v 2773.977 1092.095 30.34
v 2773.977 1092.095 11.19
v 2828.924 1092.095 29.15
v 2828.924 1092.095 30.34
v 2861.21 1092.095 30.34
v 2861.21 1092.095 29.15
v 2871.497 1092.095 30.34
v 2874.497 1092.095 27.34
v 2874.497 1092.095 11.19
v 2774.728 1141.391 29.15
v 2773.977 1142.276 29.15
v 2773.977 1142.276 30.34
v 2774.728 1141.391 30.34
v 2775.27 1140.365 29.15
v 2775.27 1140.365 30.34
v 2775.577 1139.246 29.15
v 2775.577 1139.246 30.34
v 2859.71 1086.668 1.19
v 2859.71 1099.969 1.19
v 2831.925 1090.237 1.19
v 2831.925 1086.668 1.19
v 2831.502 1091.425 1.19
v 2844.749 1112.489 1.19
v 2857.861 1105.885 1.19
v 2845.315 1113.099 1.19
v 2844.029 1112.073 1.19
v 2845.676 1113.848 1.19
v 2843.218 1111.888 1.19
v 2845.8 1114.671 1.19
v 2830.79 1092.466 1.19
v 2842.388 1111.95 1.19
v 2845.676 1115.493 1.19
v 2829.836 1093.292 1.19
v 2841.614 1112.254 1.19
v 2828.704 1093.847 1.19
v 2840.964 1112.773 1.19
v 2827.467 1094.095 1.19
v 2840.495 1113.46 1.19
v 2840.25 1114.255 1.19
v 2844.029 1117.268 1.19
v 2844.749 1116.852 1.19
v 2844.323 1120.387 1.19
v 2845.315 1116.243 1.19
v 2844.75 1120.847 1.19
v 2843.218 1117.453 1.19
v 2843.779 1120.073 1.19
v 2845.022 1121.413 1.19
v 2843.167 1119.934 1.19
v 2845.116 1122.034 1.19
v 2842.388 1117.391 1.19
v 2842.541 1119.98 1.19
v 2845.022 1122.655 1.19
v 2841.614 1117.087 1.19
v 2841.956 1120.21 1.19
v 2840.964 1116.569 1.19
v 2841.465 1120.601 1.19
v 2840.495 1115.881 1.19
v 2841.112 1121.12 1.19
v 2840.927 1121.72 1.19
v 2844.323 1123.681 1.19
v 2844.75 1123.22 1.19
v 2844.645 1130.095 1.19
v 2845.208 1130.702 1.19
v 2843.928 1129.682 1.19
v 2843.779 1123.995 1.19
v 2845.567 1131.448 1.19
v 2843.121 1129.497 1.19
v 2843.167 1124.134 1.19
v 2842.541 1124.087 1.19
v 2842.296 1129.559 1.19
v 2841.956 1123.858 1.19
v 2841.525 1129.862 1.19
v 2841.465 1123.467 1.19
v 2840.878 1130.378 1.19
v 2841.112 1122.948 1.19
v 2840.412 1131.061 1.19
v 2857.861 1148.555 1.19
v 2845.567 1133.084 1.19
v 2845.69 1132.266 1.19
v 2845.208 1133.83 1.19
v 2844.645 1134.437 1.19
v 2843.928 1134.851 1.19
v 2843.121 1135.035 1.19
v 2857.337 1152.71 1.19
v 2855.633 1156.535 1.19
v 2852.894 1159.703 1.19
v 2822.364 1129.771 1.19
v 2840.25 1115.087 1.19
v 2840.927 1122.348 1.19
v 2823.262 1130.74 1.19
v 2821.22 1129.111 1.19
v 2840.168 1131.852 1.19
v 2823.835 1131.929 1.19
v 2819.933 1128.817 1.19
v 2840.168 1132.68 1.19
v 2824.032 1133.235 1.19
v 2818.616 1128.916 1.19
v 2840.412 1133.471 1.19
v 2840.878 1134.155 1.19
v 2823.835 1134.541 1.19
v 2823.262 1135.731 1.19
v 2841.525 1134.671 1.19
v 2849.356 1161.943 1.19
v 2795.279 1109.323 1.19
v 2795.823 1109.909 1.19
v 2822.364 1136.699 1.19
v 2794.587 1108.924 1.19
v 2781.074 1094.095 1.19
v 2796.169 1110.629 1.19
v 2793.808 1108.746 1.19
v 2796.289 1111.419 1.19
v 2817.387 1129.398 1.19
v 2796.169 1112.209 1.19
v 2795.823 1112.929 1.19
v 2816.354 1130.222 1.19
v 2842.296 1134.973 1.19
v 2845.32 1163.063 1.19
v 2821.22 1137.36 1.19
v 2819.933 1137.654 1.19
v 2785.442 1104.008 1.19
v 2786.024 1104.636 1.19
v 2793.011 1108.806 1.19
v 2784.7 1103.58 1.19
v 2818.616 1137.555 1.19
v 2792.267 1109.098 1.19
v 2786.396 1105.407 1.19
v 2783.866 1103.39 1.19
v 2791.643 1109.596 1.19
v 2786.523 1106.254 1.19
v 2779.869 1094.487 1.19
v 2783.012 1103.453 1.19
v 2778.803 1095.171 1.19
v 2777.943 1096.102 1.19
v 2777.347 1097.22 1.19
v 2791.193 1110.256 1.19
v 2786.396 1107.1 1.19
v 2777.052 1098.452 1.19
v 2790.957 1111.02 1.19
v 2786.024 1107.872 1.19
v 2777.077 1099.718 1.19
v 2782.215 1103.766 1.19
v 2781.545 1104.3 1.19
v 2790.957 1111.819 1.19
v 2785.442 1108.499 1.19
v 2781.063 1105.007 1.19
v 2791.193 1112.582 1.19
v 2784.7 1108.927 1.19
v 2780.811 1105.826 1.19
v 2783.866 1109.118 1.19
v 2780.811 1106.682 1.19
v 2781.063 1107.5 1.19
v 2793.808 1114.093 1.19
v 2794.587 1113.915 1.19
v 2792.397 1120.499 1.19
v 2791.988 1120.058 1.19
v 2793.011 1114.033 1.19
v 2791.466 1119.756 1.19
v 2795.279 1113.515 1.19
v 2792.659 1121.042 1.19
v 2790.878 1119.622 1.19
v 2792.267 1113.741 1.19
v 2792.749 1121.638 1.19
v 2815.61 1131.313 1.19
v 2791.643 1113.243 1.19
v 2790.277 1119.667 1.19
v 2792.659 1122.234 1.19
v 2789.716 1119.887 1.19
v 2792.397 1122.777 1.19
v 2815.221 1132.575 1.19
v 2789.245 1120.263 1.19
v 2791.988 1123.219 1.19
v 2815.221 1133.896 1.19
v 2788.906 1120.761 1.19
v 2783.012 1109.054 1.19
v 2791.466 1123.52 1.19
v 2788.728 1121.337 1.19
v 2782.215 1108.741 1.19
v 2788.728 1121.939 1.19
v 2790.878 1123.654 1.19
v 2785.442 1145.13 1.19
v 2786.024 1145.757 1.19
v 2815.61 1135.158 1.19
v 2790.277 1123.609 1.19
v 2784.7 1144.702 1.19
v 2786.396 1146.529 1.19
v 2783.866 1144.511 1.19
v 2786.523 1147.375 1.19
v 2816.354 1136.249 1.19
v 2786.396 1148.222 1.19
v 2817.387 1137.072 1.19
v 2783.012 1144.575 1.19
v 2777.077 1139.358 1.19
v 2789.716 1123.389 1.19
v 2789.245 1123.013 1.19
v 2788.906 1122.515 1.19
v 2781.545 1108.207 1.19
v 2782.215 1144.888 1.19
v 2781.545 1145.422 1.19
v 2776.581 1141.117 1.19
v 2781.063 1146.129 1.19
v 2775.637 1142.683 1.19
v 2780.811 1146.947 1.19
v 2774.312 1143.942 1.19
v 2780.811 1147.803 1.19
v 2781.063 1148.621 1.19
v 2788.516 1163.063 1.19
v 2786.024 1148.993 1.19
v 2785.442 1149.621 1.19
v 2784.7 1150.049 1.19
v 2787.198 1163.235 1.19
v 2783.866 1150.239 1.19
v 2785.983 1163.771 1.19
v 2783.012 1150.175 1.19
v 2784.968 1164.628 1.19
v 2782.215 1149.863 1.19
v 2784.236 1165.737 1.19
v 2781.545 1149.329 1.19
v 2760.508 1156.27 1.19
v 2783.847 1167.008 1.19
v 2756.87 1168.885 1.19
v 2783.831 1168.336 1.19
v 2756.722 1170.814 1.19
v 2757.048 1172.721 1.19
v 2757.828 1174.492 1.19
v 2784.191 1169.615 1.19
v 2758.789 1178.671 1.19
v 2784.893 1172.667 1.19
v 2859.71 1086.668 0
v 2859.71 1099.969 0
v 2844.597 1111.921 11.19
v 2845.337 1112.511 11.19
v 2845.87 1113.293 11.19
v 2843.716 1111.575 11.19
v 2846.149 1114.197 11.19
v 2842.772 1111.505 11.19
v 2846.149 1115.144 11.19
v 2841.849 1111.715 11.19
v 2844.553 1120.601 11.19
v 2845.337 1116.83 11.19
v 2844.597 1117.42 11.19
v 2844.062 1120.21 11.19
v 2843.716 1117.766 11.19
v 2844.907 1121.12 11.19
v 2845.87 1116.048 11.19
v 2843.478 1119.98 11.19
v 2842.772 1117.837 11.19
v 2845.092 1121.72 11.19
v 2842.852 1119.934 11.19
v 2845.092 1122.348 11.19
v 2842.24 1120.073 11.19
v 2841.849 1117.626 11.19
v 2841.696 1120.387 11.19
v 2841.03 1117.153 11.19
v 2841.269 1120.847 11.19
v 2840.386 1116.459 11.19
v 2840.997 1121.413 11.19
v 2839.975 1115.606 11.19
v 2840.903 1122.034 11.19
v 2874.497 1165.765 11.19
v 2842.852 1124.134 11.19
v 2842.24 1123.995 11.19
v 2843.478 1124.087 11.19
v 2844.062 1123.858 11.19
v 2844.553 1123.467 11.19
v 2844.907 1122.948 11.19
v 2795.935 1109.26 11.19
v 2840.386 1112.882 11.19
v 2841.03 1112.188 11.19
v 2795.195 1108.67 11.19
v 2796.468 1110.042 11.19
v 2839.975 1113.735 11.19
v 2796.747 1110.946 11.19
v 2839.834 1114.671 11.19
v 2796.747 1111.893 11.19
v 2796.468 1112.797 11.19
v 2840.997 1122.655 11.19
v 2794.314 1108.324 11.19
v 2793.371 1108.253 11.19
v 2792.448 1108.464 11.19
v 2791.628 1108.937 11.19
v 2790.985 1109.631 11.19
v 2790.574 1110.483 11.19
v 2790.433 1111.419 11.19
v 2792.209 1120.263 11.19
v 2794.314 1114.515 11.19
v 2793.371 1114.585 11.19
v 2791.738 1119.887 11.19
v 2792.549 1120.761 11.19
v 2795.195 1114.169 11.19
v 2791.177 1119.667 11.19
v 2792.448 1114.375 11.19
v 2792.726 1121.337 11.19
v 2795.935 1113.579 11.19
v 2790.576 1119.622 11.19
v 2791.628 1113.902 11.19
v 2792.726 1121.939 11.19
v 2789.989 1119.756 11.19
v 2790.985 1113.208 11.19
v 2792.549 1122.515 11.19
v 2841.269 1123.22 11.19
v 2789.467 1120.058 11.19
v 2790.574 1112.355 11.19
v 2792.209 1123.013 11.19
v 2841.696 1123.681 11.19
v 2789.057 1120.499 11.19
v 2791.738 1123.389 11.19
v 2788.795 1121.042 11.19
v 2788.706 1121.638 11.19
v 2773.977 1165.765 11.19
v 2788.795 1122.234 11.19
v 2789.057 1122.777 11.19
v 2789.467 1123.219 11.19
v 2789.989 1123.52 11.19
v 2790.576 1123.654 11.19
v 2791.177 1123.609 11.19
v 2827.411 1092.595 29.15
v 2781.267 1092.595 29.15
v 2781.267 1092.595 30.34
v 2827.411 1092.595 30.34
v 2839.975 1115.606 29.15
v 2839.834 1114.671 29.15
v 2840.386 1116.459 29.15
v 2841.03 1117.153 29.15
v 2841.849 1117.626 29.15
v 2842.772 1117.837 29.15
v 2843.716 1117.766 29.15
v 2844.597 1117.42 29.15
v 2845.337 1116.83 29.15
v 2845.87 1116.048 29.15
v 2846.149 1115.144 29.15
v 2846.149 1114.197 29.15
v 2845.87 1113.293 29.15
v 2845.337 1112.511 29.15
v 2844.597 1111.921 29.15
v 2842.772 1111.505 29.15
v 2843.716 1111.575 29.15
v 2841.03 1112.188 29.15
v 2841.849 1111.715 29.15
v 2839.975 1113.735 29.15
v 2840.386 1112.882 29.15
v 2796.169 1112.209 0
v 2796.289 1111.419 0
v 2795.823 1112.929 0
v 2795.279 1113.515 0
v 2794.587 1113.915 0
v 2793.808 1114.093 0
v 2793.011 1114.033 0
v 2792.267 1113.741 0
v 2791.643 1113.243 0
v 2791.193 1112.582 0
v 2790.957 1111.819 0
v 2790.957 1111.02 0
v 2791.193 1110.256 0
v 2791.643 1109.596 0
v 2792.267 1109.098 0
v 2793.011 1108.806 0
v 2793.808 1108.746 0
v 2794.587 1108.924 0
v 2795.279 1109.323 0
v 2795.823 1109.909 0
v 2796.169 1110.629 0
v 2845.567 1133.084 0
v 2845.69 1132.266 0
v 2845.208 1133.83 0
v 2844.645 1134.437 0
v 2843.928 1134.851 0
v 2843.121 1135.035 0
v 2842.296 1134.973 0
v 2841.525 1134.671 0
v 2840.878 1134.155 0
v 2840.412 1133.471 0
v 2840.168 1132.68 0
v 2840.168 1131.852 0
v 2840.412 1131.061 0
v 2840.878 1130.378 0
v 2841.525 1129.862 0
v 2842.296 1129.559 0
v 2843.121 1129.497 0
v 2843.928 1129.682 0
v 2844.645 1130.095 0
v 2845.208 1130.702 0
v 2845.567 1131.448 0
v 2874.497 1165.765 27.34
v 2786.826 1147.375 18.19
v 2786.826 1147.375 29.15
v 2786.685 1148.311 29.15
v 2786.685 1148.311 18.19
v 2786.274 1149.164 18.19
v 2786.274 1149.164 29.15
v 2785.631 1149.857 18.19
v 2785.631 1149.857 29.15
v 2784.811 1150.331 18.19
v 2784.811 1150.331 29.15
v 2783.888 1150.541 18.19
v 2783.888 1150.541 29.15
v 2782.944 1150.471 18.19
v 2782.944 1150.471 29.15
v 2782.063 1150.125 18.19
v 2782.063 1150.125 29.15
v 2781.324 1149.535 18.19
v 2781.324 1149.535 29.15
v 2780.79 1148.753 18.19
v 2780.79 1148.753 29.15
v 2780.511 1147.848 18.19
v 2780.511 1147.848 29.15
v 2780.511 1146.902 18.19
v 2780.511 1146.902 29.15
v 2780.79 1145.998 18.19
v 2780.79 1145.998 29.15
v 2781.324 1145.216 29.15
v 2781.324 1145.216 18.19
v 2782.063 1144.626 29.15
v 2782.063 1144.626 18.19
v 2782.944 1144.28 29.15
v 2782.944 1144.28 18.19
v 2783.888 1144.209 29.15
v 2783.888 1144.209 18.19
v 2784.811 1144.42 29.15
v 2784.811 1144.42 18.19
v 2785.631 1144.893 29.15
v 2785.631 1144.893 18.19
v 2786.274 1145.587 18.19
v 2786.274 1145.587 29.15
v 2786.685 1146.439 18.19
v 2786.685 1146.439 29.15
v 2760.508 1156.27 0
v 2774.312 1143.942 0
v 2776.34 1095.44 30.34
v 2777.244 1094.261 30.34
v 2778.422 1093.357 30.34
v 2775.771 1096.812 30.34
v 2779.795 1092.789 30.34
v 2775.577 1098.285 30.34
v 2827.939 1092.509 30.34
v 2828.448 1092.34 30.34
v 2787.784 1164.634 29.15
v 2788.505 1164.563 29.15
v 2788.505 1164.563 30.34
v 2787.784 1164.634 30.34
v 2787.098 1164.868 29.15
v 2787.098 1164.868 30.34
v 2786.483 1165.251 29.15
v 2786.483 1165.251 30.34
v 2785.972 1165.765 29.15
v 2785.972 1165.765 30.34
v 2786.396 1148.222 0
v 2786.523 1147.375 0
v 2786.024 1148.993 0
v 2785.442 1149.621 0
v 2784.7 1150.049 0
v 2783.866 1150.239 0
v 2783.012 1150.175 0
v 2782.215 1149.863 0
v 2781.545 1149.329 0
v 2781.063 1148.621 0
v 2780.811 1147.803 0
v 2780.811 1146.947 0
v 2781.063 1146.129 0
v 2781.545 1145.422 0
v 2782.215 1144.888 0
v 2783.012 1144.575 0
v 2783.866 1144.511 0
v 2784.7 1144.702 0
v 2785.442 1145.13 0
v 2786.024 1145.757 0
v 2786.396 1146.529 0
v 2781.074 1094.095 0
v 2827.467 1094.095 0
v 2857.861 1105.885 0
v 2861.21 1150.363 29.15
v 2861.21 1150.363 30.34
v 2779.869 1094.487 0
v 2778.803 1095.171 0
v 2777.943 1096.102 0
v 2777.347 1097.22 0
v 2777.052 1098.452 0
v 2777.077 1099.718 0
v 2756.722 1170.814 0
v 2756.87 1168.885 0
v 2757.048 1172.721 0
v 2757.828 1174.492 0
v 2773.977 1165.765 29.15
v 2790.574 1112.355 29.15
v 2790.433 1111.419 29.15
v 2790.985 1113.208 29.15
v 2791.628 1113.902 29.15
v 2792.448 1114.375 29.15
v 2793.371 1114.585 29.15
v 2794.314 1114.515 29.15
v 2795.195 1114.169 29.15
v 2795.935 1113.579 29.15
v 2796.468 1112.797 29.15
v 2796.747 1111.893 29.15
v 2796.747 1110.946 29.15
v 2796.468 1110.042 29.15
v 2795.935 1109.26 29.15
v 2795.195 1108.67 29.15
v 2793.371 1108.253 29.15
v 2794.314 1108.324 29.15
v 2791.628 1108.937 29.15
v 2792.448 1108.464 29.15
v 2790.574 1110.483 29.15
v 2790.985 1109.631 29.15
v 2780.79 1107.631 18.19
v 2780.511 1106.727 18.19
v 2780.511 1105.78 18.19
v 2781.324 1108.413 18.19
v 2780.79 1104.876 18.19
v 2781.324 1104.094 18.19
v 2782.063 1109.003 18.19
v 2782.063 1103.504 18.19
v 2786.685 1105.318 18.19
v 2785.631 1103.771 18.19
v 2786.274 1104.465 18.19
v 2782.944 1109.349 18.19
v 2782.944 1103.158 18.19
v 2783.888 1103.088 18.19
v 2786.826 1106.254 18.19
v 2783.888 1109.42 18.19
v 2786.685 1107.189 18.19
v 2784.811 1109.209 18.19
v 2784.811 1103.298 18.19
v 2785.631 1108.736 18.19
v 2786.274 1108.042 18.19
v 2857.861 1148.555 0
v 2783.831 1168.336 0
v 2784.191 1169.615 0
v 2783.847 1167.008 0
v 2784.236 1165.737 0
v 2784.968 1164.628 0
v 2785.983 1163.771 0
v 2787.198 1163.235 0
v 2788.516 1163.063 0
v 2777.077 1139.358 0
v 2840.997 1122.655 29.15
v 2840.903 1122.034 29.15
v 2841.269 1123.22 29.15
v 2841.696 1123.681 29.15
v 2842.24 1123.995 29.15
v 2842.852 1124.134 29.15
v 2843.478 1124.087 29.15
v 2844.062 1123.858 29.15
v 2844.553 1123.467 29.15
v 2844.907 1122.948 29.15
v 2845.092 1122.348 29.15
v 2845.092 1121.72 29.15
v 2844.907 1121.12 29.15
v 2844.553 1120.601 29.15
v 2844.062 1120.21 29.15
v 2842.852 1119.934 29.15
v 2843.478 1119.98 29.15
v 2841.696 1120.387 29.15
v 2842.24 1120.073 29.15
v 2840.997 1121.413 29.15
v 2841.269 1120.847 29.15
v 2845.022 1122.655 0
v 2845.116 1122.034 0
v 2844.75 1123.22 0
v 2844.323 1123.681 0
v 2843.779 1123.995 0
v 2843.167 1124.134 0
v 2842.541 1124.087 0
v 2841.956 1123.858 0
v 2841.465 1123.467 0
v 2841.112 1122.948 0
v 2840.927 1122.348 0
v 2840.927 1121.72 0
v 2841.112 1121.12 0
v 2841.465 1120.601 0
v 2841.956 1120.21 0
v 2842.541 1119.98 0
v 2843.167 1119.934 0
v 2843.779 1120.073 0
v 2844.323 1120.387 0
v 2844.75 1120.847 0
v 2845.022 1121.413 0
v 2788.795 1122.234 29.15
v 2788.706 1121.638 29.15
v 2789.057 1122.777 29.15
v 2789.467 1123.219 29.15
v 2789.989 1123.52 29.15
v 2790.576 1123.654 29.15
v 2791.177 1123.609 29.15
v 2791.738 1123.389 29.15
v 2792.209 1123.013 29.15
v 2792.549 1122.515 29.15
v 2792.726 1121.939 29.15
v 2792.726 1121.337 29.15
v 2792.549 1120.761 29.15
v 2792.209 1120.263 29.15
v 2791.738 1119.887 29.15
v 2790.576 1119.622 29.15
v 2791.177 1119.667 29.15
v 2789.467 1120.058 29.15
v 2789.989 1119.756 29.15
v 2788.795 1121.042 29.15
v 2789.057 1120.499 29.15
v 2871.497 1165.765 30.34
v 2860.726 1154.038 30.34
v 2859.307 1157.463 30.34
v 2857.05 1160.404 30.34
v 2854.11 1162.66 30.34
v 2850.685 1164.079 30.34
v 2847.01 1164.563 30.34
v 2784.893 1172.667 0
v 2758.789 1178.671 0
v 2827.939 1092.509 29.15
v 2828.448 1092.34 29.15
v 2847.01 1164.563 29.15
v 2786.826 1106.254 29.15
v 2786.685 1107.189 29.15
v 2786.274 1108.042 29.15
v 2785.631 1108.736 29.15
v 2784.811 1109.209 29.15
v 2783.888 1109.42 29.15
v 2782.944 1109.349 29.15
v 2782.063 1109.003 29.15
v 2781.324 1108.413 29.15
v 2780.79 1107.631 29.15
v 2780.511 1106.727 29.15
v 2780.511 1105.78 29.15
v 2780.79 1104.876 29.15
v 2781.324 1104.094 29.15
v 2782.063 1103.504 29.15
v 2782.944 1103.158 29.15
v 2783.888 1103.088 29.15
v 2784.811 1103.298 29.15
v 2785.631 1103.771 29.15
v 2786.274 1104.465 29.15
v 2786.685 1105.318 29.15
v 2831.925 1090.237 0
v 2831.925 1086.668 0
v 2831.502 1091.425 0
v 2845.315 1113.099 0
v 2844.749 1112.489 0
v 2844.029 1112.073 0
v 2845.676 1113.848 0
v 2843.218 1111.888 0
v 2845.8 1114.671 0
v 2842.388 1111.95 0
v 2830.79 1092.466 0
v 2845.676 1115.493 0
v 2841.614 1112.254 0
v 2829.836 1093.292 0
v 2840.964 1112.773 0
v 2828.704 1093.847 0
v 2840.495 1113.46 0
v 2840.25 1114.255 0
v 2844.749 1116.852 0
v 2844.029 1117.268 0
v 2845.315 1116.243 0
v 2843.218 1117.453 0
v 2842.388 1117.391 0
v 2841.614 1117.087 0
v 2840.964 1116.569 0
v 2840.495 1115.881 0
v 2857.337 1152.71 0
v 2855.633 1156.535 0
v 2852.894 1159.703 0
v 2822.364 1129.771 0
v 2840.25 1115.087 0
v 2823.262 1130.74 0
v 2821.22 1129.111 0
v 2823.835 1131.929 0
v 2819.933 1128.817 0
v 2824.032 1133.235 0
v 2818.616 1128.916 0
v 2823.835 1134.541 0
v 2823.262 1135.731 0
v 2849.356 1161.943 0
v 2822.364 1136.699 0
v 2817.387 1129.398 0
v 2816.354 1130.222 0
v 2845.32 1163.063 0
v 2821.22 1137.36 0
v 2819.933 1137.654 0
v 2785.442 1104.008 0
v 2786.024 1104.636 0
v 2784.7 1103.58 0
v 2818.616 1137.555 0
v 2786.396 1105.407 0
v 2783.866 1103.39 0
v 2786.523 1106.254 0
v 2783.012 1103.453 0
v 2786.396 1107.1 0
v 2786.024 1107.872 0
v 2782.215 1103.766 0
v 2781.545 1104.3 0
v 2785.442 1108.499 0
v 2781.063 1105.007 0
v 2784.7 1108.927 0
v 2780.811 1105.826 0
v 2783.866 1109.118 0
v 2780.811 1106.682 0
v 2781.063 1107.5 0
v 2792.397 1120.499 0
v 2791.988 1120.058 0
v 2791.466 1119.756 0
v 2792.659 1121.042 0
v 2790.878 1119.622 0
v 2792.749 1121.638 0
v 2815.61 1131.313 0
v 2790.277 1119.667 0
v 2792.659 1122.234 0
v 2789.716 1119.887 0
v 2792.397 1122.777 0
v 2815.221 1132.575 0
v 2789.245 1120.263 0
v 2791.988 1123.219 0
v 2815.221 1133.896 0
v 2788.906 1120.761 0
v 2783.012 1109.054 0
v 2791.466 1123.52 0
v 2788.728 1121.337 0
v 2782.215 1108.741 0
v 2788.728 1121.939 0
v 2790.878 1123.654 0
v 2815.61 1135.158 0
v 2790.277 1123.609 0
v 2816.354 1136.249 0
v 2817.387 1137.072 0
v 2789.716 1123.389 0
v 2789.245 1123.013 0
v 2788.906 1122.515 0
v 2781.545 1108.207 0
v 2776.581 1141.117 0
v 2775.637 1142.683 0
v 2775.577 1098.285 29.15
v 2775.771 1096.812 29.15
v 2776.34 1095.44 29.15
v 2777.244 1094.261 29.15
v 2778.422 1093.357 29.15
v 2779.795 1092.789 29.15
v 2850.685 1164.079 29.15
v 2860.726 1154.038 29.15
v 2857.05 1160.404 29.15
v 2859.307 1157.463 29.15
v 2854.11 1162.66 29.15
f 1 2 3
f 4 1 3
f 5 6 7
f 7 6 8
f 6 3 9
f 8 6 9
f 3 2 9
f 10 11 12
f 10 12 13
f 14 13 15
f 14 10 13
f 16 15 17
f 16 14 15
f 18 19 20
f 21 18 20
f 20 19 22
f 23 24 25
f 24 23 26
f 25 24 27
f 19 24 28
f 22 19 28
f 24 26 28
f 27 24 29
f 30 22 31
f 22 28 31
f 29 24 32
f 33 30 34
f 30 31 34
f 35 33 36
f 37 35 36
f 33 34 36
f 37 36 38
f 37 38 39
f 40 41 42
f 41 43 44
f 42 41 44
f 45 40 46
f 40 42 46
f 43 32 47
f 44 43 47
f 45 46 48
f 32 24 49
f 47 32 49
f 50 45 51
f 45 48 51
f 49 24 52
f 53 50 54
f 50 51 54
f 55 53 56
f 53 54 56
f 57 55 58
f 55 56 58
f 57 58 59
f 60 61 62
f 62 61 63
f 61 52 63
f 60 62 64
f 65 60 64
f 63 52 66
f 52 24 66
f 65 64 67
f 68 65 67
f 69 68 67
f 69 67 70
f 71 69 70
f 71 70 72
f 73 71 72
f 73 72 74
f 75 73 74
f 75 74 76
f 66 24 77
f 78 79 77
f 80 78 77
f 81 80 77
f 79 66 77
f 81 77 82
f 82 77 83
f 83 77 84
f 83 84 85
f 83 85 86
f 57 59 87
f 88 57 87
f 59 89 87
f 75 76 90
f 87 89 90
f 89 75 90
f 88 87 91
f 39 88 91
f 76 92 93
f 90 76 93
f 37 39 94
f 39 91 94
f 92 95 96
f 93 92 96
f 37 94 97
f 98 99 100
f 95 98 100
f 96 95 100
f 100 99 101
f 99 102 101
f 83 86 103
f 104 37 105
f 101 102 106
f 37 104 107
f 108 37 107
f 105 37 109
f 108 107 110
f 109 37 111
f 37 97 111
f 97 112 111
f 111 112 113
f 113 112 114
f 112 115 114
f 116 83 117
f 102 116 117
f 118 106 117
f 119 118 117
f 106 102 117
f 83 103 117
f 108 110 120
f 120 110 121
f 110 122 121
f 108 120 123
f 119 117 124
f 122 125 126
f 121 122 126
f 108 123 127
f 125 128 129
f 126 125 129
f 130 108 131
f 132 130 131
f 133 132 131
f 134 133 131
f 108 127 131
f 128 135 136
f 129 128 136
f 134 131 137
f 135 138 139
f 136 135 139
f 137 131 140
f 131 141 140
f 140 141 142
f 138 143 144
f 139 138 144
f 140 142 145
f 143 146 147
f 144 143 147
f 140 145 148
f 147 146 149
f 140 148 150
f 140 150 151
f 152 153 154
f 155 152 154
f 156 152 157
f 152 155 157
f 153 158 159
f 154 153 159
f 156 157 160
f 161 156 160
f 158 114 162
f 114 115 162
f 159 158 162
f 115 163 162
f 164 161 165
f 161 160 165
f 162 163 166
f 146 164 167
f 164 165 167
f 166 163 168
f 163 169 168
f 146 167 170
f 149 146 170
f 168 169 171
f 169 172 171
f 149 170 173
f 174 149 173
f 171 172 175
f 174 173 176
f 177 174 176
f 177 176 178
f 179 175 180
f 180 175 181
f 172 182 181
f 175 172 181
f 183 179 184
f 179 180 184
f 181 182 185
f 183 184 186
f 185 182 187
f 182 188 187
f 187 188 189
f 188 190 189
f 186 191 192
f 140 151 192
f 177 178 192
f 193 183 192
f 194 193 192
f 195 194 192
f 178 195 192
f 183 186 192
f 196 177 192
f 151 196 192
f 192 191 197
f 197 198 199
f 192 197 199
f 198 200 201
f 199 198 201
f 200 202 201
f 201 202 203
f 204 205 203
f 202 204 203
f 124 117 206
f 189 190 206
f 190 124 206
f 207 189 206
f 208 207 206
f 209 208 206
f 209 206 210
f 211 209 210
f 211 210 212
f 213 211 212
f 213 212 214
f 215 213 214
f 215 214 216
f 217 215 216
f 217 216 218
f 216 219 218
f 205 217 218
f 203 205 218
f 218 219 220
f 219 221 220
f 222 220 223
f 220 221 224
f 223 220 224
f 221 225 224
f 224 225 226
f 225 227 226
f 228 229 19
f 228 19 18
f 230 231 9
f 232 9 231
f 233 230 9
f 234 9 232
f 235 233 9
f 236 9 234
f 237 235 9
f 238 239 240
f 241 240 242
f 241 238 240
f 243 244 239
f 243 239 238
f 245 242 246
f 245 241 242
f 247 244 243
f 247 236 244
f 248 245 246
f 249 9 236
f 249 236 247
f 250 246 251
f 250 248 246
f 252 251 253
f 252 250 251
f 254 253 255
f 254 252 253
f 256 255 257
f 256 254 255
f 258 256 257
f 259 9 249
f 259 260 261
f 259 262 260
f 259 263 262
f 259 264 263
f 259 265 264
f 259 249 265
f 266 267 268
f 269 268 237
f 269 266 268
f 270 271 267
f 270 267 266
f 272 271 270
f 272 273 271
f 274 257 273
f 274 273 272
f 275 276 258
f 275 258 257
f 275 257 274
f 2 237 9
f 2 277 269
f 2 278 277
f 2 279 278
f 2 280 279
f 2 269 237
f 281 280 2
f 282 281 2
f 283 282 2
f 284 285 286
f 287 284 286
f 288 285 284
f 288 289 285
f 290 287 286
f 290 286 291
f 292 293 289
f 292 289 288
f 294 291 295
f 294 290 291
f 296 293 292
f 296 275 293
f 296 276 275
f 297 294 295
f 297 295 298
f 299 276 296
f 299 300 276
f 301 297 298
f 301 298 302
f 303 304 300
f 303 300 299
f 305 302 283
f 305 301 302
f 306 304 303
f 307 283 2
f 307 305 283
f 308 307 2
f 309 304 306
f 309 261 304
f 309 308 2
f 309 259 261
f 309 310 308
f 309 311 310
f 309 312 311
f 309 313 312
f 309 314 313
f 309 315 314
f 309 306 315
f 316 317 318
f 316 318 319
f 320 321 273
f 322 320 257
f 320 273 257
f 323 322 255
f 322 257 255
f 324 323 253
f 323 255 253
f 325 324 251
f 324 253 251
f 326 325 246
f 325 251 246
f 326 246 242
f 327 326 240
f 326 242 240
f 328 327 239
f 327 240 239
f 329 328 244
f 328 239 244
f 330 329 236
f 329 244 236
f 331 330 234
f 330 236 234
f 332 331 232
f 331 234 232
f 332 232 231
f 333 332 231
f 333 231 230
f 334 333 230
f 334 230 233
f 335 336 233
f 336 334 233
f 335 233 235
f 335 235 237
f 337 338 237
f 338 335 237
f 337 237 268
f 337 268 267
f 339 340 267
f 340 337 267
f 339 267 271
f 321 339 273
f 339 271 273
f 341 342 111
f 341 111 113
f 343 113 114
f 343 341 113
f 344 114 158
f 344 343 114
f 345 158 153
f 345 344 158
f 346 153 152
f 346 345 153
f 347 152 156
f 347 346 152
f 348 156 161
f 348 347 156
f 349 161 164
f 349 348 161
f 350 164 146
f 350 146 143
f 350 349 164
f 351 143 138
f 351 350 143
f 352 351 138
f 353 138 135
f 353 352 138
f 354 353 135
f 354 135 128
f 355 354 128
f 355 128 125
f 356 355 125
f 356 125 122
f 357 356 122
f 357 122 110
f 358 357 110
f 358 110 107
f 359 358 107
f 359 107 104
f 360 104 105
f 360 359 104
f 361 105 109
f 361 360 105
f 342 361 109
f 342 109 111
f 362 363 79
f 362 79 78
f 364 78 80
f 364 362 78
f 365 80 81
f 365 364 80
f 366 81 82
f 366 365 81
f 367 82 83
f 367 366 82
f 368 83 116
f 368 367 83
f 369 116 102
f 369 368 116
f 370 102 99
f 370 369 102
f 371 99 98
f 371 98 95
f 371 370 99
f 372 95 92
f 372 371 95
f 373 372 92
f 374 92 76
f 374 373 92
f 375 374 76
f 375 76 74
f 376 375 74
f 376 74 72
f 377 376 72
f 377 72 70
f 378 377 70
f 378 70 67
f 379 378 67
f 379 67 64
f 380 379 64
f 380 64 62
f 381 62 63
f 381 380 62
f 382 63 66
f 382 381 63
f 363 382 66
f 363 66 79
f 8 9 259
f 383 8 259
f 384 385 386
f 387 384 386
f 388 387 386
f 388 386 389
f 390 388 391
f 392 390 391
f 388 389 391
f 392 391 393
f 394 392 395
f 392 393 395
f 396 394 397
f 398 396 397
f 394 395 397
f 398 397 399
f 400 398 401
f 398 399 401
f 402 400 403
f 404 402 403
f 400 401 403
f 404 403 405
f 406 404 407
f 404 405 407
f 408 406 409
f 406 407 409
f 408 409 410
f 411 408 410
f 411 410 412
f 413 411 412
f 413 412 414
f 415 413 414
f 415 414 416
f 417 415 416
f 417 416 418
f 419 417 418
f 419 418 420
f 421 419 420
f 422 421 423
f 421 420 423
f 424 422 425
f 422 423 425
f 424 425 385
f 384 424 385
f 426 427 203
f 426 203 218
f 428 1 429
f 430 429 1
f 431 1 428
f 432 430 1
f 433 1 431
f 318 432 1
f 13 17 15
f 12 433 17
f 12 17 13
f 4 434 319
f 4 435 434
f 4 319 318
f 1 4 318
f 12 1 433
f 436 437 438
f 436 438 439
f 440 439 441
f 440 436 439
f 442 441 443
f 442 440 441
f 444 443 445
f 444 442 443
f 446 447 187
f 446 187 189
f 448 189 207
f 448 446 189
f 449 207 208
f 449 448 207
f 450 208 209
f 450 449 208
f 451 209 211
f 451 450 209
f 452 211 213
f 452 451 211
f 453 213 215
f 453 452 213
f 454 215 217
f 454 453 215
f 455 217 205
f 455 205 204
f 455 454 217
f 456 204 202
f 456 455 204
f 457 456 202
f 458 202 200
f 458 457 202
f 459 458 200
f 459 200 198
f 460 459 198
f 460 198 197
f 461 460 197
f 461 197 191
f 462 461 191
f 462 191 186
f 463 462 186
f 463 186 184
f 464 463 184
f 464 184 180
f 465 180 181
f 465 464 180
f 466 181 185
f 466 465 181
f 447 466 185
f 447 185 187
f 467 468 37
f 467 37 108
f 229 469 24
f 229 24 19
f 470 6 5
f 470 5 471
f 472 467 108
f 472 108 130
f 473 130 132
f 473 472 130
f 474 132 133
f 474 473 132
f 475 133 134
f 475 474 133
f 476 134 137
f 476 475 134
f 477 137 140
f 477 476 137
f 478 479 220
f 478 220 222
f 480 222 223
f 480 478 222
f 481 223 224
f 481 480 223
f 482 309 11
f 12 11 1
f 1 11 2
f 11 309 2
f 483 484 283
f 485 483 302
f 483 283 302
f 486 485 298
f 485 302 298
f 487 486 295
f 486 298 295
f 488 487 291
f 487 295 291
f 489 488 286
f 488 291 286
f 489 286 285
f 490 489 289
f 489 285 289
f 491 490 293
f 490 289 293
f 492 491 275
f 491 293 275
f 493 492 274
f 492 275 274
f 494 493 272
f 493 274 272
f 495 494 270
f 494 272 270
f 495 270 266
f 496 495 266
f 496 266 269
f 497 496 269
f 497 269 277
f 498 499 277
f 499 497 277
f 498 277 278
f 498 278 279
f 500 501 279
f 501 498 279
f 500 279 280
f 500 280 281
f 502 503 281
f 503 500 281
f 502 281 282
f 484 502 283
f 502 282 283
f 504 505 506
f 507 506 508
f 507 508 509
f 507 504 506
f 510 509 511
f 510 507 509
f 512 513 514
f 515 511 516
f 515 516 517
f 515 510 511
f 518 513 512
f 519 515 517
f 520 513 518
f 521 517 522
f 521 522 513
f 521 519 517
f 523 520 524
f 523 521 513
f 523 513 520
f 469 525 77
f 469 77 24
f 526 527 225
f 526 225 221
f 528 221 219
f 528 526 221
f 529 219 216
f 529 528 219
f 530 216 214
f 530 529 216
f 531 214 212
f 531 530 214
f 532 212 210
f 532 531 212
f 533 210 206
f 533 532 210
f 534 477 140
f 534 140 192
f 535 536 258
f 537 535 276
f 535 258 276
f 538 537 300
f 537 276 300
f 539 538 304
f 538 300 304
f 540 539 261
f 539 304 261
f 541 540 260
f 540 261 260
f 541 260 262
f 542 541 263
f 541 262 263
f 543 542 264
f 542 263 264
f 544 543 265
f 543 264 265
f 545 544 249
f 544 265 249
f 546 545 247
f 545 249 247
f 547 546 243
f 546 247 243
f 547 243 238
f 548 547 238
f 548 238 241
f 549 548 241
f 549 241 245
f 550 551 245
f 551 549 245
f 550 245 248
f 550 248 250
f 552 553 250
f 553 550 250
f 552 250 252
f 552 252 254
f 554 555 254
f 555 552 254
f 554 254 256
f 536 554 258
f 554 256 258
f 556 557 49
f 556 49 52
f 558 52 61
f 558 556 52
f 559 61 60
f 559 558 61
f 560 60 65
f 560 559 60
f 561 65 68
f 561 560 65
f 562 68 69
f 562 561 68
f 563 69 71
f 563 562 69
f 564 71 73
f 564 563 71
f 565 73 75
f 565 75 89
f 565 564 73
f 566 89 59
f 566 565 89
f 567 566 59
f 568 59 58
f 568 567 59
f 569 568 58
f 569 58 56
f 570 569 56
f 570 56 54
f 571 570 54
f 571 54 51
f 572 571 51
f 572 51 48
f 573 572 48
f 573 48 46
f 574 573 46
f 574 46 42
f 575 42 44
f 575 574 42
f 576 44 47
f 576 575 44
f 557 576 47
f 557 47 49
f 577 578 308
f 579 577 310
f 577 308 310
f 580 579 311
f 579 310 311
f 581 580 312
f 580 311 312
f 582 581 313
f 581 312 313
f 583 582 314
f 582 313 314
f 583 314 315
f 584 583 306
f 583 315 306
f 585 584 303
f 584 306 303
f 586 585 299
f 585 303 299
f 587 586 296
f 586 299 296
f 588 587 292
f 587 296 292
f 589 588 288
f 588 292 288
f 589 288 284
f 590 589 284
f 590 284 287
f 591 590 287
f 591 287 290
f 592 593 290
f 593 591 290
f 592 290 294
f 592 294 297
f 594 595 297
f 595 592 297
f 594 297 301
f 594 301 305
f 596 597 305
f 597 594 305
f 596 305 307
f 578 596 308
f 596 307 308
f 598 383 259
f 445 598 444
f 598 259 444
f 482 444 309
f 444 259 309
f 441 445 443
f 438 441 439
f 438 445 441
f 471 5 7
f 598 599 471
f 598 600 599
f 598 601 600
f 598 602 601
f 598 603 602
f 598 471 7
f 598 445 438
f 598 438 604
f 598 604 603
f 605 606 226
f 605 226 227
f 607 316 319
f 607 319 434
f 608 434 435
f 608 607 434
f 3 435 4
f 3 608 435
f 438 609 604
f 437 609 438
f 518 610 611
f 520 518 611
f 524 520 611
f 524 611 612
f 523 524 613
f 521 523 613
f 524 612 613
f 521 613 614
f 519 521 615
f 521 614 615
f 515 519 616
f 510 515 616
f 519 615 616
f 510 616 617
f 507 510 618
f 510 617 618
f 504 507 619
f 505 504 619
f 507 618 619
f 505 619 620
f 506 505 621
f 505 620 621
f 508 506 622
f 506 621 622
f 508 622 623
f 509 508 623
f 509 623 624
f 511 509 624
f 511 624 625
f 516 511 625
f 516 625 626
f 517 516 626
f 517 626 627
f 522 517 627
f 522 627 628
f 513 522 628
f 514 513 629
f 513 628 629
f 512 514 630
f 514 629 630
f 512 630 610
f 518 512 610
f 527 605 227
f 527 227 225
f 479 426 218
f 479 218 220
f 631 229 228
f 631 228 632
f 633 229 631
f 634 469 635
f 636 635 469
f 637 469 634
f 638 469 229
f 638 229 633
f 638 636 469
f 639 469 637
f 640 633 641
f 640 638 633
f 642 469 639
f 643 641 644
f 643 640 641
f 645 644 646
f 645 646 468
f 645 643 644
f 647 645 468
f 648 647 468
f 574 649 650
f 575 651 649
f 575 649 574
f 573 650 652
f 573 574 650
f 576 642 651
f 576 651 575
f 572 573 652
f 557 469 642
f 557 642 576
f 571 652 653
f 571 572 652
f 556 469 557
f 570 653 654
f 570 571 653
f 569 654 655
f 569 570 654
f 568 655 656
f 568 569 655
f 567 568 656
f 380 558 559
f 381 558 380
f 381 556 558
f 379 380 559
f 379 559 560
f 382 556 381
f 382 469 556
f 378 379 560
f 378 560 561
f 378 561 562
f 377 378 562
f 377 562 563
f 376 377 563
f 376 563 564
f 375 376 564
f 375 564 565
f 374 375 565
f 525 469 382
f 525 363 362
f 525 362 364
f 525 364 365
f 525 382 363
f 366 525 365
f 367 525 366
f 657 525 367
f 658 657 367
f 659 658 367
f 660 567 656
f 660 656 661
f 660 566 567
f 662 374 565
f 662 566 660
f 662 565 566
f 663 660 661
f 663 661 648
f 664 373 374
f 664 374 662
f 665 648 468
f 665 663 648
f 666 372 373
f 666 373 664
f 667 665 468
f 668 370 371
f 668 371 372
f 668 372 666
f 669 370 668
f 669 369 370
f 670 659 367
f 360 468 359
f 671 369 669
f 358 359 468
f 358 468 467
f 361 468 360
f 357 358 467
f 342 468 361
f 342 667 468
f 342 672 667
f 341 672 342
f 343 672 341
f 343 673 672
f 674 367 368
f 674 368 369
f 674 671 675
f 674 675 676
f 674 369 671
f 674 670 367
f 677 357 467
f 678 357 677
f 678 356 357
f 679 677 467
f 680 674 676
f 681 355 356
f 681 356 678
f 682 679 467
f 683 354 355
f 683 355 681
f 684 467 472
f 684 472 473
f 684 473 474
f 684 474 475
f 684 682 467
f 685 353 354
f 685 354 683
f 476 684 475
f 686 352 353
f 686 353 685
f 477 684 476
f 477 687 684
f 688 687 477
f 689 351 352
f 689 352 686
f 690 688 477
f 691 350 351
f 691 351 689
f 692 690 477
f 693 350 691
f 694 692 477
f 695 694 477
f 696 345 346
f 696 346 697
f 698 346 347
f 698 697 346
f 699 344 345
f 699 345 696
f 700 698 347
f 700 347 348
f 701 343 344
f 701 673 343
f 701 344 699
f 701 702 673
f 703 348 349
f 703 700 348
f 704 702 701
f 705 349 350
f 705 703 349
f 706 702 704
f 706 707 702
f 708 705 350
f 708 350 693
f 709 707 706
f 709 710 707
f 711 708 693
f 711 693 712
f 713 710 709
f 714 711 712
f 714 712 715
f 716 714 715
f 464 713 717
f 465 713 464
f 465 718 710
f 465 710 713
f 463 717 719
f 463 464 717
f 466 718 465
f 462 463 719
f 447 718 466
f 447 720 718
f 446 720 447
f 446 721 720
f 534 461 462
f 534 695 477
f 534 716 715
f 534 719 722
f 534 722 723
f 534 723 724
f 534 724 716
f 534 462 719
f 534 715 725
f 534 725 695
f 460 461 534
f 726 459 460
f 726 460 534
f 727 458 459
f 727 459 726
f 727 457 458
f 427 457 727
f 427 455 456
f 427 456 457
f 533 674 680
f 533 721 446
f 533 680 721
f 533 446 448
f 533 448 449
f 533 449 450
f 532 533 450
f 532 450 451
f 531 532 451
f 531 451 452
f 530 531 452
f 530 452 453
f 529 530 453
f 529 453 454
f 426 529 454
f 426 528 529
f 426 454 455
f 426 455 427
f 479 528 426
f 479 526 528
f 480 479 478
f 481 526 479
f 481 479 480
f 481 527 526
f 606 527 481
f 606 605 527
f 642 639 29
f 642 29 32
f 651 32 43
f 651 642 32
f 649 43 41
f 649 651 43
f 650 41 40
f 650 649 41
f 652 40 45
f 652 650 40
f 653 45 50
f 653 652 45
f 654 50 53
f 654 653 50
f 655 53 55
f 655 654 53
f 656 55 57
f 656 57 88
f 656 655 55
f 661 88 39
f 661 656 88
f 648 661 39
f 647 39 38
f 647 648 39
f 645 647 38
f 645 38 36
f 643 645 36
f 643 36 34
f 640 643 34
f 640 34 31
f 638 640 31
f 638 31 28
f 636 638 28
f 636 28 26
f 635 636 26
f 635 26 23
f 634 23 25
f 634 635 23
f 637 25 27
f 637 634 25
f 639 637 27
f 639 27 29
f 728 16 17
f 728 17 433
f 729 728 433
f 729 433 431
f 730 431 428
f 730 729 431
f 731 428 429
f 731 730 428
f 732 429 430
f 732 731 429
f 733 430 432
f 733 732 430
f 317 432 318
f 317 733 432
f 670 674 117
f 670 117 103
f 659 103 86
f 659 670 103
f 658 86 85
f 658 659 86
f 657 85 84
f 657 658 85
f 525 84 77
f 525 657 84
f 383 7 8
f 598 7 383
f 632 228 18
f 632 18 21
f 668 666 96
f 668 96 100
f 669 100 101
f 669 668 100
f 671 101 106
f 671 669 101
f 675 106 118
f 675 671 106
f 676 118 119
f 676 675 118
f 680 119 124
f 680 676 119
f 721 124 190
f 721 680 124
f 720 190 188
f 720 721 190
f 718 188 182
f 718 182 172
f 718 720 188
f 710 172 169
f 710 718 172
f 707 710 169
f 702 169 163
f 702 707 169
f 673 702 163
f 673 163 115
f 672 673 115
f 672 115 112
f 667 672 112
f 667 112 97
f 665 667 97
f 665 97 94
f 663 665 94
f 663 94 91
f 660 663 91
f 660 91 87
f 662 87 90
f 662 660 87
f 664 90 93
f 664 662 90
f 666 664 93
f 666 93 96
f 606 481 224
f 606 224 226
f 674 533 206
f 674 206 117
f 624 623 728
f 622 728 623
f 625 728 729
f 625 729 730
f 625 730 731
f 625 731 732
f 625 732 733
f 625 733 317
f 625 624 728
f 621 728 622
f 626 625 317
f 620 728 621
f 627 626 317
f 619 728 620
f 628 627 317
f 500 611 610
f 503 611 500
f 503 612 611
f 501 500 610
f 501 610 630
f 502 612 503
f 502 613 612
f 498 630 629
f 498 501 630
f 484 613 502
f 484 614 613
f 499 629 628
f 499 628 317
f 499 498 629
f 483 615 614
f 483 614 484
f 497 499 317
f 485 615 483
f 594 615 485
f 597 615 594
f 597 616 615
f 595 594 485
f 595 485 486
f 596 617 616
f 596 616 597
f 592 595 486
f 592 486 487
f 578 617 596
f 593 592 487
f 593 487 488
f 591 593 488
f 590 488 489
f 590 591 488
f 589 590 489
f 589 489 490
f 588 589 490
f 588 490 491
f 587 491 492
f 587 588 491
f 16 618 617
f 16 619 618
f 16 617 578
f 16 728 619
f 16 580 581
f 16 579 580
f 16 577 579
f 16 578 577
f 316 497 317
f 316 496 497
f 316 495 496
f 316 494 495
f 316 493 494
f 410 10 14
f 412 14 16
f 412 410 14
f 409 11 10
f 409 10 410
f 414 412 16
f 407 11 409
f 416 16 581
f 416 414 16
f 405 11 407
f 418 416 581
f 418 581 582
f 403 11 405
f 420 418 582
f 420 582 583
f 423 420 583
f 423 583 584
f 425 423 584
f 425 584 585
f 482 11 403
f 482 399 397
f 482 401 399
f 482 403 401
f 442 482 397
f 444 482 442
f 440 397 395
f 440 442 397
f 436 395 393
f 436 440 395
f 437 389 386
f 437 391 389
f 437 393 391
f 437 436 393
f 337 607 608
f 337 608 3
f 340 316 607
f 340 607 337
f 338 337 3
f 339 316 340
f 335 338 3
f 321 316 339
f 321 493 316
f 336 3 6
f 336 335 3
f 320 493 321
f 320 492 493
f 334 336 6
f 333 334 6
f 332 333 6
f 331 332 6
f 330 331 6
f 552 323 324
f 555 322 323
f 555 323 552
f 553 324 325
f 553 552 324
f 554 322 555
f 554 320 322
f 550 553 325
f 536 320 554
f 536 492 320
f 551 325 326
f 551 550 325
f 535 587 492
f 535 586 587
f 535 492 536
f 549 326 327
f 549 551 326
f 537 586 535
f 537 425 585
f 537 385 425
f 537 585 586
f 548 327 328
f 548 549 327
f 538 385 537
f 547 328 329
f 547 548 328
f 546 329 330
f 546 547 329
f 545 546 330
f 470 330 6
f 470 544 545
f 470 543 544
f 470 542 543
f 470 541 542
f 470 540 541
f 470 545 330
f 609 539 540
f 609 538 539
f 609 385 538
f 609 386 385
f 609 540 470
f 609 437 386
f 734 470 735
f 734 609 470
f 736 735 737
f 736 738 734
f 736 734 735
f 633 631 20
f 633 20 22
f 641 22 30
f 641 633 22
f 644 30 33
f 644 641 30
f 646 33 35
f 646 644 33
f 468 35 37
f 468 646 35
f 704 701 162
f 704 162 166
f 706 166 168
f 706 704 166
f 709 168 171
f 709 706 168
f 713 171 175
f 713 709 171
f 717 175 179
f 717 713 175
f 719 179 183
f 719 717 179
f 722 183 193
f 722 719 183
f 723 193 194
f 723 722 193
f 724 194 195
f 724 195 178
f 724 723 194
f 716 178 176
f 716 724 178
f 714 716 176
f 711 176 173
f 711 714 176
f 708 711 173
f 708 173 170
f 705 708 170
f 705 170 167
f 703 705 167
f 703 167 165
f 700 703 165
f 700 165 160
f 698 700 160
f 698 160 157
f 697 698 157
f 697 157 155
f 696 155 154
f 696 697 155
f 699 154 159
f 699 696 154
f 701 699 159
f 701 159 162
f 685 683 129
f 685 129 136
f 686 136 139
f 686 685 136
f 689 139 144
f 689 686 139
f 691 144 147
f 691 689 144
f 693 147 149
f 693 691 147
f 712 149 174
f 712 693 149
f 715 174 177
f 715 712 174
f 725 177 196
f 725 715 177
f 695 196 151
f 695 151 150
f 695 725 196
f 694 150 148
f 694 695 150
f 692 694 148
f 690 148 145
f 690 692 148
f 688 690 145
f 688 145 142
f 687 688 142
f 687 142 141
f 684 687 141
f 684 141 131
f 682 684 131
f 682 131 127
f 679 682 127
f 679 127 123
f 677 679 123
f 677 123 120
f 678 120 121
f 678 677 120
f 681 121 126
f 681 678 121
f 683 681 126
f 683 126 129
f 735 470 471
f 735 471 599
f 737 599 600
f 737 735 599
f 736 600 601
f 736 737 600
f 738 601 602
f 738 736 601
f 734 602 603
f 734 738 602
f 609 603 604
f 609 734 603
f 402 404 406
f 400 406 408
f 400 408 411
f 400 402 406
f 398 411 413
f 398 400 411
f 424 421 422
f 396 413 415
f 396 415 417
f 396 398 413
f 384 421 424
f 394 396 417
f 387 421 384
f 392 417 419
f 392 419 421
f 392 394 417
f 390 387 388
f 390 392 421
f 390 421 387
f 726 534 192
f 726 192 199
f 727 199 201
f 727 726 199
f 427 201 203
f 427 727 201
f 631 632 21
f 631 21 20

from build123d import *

# Parameters (mm, degrees)
CROQUIS1_R              = 4.430496459
CROQUIS1_R_2            = 2.021537648
CROQUIS1_R_3            = 2.872174668
CROQUIS1_R_4            = 2.680697474
CROQUIS1_R_5            = 2.776444448
CROQUIS1_R_6            = 2.106249137
CROQUIS1_R_7            = 2.790383016
SALIENTE_EXTRUIR1_DEPTH = 1.19
CROQUIS7_W              = 102.52
CROQUIS7_H              = 77.67
SALIENTE_EXTRUIR2_DEPTH = 19.15
CROQUIS8_R              = 2.021537648
CROQUIS8_R_2            = 3.175
CROQUIS8_R_3            = 2.106249137
CORTAR_EXTRUIR3_DEPTH   = 3107.825691909
CROQUIS8_7_R            = 2.856101073
CROQUIS8_7_R_2          = 2.872174668
CORTAR_EXTRUIR4_DEPTH   = 19.15
CROQUIS12_R             = 2.872174668
CROQUIS12_R_2           = 2.856101073
SALIENTE_EXTRUIR3_DEPTH = 7
CORTAR_EXTRUIR8_START   = -1.19
CROQUIS13_R             = 2.856101073
CROQUIS13_R_2           = 2.021537648
CROQUIS13_R_3           = 3.175
CROQUIS13_R_4           = 2.106249137
CROQUIS13_R_5           = 2.872174668
CORTAR_EXTRUIR8_DEPTH   = 1.19
CORTAR_EXTRUIR9_DEPTH   = 3107.825691909
CROQUIS15_R             = 3.175
CORTAR_EXTRUIR10_DEPTH  = 10.96
CHAFL_N1_SIZE           = 3


with BuildPart() as part:
    # Croquis1 → Saliente-Extruir1 (new body)
    with BuildSketch(Plane.XY):
        with BuildLine():
            Line((2788.515923591, 1163.062896503), (2845.320282862, 1163.062896503))
            ThreePointArc((2845.320282862, 1163.062896503), (2854.380265752, 1158.219977336), (2857.861371877, 1148.554623946))
            Line((2857.861371877, 1148.554623946), (2857.861371877, 1105.884683704))
            Line((2857.861371877, 1105.884683704), (2859.709564321, 1099.969499723))
            Line((2859.709564321, 1099.969499723), (2859.709564321, 1086.668463787))
            Line((2859.709564321, 1086.668463787), (2831.925019811, 1086.668463787))
            Line((2831.925019811, 1086.668463787), (2831.925019811, 1090.237043102))
            ThreePointArc((2831.925019811, 1090.237043102), (2830.339855276, 1092.909707682), (2827.46732338, 1094.094799688))
            Line((2827.46732338, 1094.094799688), (2781.073788136, 1094.094799688))
            ThreePointArc((2781.073788136, 1094.094799688), (2777.943377157, 1096.10205762), (2777.077273901, 1099.718467781))
            Line((2777.077273901, 1099.718467781), (2777.077273901, 1139.357764533))
            ThreePointArc((2777.077273901, 1139.357764533), (2776.16191908, 1141.931561181), (2774.31245647, 1143.941981956))
            Line((2774.31245647, 1143.941981956), (2760.508490421, 1156.27030536))
            Line((2760.508490421, 1156.27030536), (2756.869619555, 1168.884626052))
            ThreePointArc((2756.869619555, 1168.884626052), (2756.826740412, 1171.777711215), (2757.827792947, 1174.492425601))
            Line((2757.827792947, 1174.492425601), (2758.788780948, 1178.67068333))
            Line((2758.788780948, 1178.67068333), (2784.893128388, 1172.66675387))
            Line((2784.893128388, 1172.66675387), (2784.19129322, 1169.615260811))
            ThreePointArc((2784.19129322, 1169.615260811), (2784.56217485, 1165.156713392), (2788.515923591, 1163.062896503))
        make_face()
        with Locations((2819.601763615, 1133.235396685)):
            Circle(CROQUIS1_R, mode=Mode.SUBTRACT)
        with Locations((2790.727223865, 1121.638053324)):
            Circle(CROQUIS1_R_2, mode=Mode.SUBTRACT)
        with Locations((2783.65094449, 1147.375154376)):
            Circle(CROQUIS1_R_3, mode=Mode.SUBTRACT)
        with Locations((2793.607825607, 1111.419307874)):
            Circle(CROQUIS1_R_4, mode=Mode.SUBTRACT)
        with Locations((2783.65094449, 1106.253651095)):
            Circle(CROQUIS1_R_3, mode=Mode.SUBTRACT)
        with Locations((2842.913546585, 1132.266044758)):
            Circle(CROQUIS1_R_5, mode=Mode.SUBTRACT)
        with Locations((2843.009293559, 1122.033928625)):
            Circle(CROQUIS1_R_6, mode=Mode.SUBTRACT)
        with Locations((2843.009293559, 1114.670632569)):
            Circle(CROQUIS1_R_7, mode=Mode.SUBTRACT)
    extrude(amount=SALIENTE_EXTRUIR1_DEPTH)


with BuildPart() as body_2:
    # Croquis7 → Saliente-Extruir2 (new body)
    with BuildSketch(Plane.XY.offset(11.19)):
        with Locations((2823.237273901, 1128.929799688)):
            Rectangle(CROQUIS7_W, CROQUIS7_H)
    extrude(amount=SALIENTE_EXTRUIR2_DEPTH)

    # Croquis8 → Cortar-Extruir3 (cut, through all)
    with BuildSketch(Plane(origin=(0, 0, 11.19), x_dir=(-1, 0, 0), z_dir=(0, 0, -1))):
        with Locations((-2790.727223865, 1121.638053324)):
            Circle(CROQUIS8_R)
        with Locations((-2793.607825607, 1111.419307874)):
            Circle(CROQUIS8_R_2)
        with Locations((-2843.009293559, 1122.033928625)):
            Circle(CROQUIS8_R_3)
        with Locations((-2843.009293559, 1114.670632569)):
            Circle(CROQUIS8_R_2)
    extrude(amount=-CORTAR_EXTRUIR3_DEPTH, mode=Mode.SUBTRACT)

    # Croquis8<7> → Cortar-Extruir4 (cut)
    with BuildSketch(Plane(origin=(0, 0, 11.19), x_dir=(-1, 0, 0), z_dir=(0, 0, -1))):
        with Locations((-2783.65094449, 1106.253651095)):
            Circle(CROQUIS8_7_R)
        with Locations((-2783.65094449, 1147.375154376)):
            Circle(CROQUIS8_7_R_2)
    extrude(amount=-CORTAR_EXTRUIR4_DEPTH, mode=Mode.SUBTRACT)

    # Croquis12 → Saliente-Extruir3 (add)
    with BuildSketch(Plane(origin=(0, 0, 11.19), x_dir=(-1, 0, 0), z_dir=(0, 0, -1))):
        with Locations((-2783.65094449, 1147.375154376)):
            Circle(CROQUIS12_R)
        with Locations((-2783.65094449, 1106.253651095)):
            Circle(CROQUIS12_R_2)
    extrude(amount=-SALIENTE_EXTRUIR3_DEPTH)

    # Croquis13 → Cortar-Extruir8 (cut)
    # profile 1 of 3: a face of its own
    with BuildSketch(Plane.XY.offset(30.34).offset(CORTAR_EXTRUIR8_START)):
        with BuildLine():
            Line((2831.953626457, 1090.094799688), (2859.709564321, 1090.094799688))
            Line((2859.709564321, 1090.094799688), (2859.709564321, 1150.362896503))
            ThreePointArc((2859.709564321, 1150.362896503), (2855.989820443, 1159.343152624), (2847.009564321, 1163.062896503))
            Line((2847.009564321, 1163.062896503), (2788.515923591, 1163.062896503))
            ThreePointArc((2788.515923591, 1163.062896503), (2785.1646573, 1164.420153501), (2783.791167513, 1167.764799688))
            Line((2783.791167513, 1167.764799688), (2771.977273901, 1167.764799688))
            Line((2771.977273901, 1167.764799688), (2771.977273901, 1146.027533733))
            Line((2771.977273901, 1146.027533733), (2774.31245647, 1143.941981956))
            ThreePointArc((2774.31245647, 1143.941981956), (2776.16191908, 1141.931561181), (2777.077273901, 1139.357764533))
            Line((2777.077273901, 1139.357764533), (2777.077273901, 1098.284799688))
            ThreePointArc((2777.077273901, 1098.284799688), (2778.304496488, 1095.322022275), (2781.267273901, 1094.094799688))
            Line((2781.267273901, 1094.094799688), (2827.46732338, 1094.094799688))
            ThreePointArc((2827.46732338, 1094.094799688), (2830.394360406, 1092.86182908), (2831.953626457, 1090.094799688))
        make_face()
        with Locations(Location((2783.65094449, 1106.253651095, 0), (0, 0, 180))):
            Circle(CROQUIS13_R, mode=Mode.SUBTRACT)
        with Locations(Location((2790.727223865, 1121.638053324, 0), (0, 0, 180))):
            Circle(CROQUIS13_R_2, mode=Mode.SUBTRACT)
        with Locations(Location((2793.607825607, 1111.419307874, 0), (0, 0, 180))):
            Circle(CROQUIS13_R_3, mode=Mode.SUBTRACT)
        with Locations(Location((2843.009293559, 1114.670632569, 0), (0, 0, 180))):
            Circle(CROQUIS13_R_3, mode=Mode.SUBTRACT)
        with Locations(Location((2843.009293559, 1122.033928625, 0), (0, 0, 180))):
            Circle(CROQUIS13_R_4, mode=Mode.SUBTRACT)
        with Locations(Location((2783.65094449, 1147.375154376, 0), (0, 0, 180))):
            Circle(CROQUIS13_R_5, mode=Mode.SUBTRACT)
    # profile 2 of 3: a face of its own
    with BuildSketch(Plane.XY.offset(30.34).offset(CORTAR_EXTRUIR8_START)):
        with BuildLine():
            Line((2859.709564321, 1150.362896503), (2859.709564321, 1090.094799688))
            Line((2859.709564321, 1090.094799688), (2861.209564321, 1090.094799688))
            Line((2861.209564321, 1090.094799688), (2861.209564321, 1150.362896503))
            ThreePointArc((2861.209564321, 1150.362896503), (2857.050480614, 1160.403812796), (2847.009564321, 1164.562896503))
            Line((2847.009564321, 1164.562896503), (2788.504935412, 1164.562896503))
            ThreePointArc((2788.504935412, 1164.562896503), (2786.221426595, 1165.484692718), (2785.291247589, 1167.764799688))
            Line((2785.291247589, 1167.764799688), (2783.791167513, 1167.764799688))
            ThreePointArc((2783.791167513, 1167.764799688), (2785.1646573, 1164.420153501), (2788.515923591, 1163.062896503))
            Line((2788.515923591, 1163.062896503), (2847.009564321, 1163.062896503))
            ThreePointArc((2847.009564321, 1163.062896503), (2855.989820443, 1159.343152624), (2859.709564321, 1150.362896503))
        make_face()
    # profile 3 of 3: a face of its own
    with BuildSketch(Plane.XY.offset(30.34).offset(CORTAR_EXTRUIR8_START)):
        with BuildLine():
            Line((2830.41617467, 1090.094799688), (2831.953626457, 1090.094799688))
            ThreePointArc((2831.953626457, 1090.094799688), (2830.394360406, 1092.86182908), (2827.46732338, 1094.094799688))
            Line((2827.46732338, 1094.094799688), (2781.267273901, 1094.094799688))
            ThreePointArc((2781.267273901, 1094.094799688), (2778.304496488, 1095.322022275), (2777.077273901, 1098.284799688))
            Line((2777.077273901, 1098.284799688), (2777.077273901, 1139.357764533))
            ThreePointArc((2777.077273901, 1139.357764533), (2776.16191908, 1141.931561181), (2774.31245647, 1143.941981956))
            Line((2774.31245647, 1143.941981956), (2771.977273901, 1146.027533733))
            Line((2771.977273901, 1146.027533733), (2771.977273901, 1144.016399101))
            Line((2771.977273901, 1144.016399101), (2773.374482197, 1142.768552238))
            ThreePointArc((2773.374482197, 1142.768552238), (2774.832525087, 1141.230026801), (2775.577273901, 1139.245512051))
            Line((2775.577273901, 1139.245512051), (2775.577273901, 1098.284799688))
            ThreePointArc((2775.577273901, 1098.284799688), (2777.243836316, 1094.261362103), (2781.267273901, 1092.594799688))
            Line((2781.267273901, 1092.594799688), (2827.41067607, 1092.594799688))
            ThreePointArc((2827.41067607, 1092.594799688), (2829.307496614, 1091.818551917), (2830.41617467, 1090.094799688))
        make_face()
    extrude(amount=CORTAR_EXTRUIR8_DEPTH, mode=Mode.SUBTRACT)

    # Croquis14 → Cortar-Extruir9 (cut, through all)
    with BuildSketch(Plane(origin=(0, 0, 11.19), x_dir=(-1, 0, 0), z_dir=(0, 0, -1))):
        Polygon((-2773.977273901, 1165.764799688), (-2773.977273901, 1092.094799688), (-2874.497273901, 1092.094799688), (-2874.497273901, 1090.094799688), (-2771.977273901, 1090.094799688), (-2771.977273901, 1167.764799688), (-2874.497273901, 1167.764799688), (-2874.497273901, 1165.764799688), align=None)
    extrude(amount=-CORTAR_EXTRUIR9_DEPTH, mode=Mode.SUBTRACT)

    # Croquis15 → Cortar-Extruir10 (cut)
    with BuildSketch(Plane.XY.offset(29.15)):
        with Locations((2783.65094449, 1147.375154376)):
            Circle(CROQUIS15_R)
        with Locations((2783.65094449, 1106.253651095)):
            Circle(CROQUIS15_R)
    extrude(amount=-CORTAR_EXTRUIR10_DEPTH, mode=Mode.SUBTRACT)

    # Chaflán1
    chafl_n1_edges = [body_2.edges().sort_by_distance(p)[0] for p in [
        (2874.497273901, 1128.929799688, 30.34),
    ]]
    chamfer(chafl_n1_edges, length=CHAFL_N1_SIZE)


solid = Compound([part.part, body_2.part])
